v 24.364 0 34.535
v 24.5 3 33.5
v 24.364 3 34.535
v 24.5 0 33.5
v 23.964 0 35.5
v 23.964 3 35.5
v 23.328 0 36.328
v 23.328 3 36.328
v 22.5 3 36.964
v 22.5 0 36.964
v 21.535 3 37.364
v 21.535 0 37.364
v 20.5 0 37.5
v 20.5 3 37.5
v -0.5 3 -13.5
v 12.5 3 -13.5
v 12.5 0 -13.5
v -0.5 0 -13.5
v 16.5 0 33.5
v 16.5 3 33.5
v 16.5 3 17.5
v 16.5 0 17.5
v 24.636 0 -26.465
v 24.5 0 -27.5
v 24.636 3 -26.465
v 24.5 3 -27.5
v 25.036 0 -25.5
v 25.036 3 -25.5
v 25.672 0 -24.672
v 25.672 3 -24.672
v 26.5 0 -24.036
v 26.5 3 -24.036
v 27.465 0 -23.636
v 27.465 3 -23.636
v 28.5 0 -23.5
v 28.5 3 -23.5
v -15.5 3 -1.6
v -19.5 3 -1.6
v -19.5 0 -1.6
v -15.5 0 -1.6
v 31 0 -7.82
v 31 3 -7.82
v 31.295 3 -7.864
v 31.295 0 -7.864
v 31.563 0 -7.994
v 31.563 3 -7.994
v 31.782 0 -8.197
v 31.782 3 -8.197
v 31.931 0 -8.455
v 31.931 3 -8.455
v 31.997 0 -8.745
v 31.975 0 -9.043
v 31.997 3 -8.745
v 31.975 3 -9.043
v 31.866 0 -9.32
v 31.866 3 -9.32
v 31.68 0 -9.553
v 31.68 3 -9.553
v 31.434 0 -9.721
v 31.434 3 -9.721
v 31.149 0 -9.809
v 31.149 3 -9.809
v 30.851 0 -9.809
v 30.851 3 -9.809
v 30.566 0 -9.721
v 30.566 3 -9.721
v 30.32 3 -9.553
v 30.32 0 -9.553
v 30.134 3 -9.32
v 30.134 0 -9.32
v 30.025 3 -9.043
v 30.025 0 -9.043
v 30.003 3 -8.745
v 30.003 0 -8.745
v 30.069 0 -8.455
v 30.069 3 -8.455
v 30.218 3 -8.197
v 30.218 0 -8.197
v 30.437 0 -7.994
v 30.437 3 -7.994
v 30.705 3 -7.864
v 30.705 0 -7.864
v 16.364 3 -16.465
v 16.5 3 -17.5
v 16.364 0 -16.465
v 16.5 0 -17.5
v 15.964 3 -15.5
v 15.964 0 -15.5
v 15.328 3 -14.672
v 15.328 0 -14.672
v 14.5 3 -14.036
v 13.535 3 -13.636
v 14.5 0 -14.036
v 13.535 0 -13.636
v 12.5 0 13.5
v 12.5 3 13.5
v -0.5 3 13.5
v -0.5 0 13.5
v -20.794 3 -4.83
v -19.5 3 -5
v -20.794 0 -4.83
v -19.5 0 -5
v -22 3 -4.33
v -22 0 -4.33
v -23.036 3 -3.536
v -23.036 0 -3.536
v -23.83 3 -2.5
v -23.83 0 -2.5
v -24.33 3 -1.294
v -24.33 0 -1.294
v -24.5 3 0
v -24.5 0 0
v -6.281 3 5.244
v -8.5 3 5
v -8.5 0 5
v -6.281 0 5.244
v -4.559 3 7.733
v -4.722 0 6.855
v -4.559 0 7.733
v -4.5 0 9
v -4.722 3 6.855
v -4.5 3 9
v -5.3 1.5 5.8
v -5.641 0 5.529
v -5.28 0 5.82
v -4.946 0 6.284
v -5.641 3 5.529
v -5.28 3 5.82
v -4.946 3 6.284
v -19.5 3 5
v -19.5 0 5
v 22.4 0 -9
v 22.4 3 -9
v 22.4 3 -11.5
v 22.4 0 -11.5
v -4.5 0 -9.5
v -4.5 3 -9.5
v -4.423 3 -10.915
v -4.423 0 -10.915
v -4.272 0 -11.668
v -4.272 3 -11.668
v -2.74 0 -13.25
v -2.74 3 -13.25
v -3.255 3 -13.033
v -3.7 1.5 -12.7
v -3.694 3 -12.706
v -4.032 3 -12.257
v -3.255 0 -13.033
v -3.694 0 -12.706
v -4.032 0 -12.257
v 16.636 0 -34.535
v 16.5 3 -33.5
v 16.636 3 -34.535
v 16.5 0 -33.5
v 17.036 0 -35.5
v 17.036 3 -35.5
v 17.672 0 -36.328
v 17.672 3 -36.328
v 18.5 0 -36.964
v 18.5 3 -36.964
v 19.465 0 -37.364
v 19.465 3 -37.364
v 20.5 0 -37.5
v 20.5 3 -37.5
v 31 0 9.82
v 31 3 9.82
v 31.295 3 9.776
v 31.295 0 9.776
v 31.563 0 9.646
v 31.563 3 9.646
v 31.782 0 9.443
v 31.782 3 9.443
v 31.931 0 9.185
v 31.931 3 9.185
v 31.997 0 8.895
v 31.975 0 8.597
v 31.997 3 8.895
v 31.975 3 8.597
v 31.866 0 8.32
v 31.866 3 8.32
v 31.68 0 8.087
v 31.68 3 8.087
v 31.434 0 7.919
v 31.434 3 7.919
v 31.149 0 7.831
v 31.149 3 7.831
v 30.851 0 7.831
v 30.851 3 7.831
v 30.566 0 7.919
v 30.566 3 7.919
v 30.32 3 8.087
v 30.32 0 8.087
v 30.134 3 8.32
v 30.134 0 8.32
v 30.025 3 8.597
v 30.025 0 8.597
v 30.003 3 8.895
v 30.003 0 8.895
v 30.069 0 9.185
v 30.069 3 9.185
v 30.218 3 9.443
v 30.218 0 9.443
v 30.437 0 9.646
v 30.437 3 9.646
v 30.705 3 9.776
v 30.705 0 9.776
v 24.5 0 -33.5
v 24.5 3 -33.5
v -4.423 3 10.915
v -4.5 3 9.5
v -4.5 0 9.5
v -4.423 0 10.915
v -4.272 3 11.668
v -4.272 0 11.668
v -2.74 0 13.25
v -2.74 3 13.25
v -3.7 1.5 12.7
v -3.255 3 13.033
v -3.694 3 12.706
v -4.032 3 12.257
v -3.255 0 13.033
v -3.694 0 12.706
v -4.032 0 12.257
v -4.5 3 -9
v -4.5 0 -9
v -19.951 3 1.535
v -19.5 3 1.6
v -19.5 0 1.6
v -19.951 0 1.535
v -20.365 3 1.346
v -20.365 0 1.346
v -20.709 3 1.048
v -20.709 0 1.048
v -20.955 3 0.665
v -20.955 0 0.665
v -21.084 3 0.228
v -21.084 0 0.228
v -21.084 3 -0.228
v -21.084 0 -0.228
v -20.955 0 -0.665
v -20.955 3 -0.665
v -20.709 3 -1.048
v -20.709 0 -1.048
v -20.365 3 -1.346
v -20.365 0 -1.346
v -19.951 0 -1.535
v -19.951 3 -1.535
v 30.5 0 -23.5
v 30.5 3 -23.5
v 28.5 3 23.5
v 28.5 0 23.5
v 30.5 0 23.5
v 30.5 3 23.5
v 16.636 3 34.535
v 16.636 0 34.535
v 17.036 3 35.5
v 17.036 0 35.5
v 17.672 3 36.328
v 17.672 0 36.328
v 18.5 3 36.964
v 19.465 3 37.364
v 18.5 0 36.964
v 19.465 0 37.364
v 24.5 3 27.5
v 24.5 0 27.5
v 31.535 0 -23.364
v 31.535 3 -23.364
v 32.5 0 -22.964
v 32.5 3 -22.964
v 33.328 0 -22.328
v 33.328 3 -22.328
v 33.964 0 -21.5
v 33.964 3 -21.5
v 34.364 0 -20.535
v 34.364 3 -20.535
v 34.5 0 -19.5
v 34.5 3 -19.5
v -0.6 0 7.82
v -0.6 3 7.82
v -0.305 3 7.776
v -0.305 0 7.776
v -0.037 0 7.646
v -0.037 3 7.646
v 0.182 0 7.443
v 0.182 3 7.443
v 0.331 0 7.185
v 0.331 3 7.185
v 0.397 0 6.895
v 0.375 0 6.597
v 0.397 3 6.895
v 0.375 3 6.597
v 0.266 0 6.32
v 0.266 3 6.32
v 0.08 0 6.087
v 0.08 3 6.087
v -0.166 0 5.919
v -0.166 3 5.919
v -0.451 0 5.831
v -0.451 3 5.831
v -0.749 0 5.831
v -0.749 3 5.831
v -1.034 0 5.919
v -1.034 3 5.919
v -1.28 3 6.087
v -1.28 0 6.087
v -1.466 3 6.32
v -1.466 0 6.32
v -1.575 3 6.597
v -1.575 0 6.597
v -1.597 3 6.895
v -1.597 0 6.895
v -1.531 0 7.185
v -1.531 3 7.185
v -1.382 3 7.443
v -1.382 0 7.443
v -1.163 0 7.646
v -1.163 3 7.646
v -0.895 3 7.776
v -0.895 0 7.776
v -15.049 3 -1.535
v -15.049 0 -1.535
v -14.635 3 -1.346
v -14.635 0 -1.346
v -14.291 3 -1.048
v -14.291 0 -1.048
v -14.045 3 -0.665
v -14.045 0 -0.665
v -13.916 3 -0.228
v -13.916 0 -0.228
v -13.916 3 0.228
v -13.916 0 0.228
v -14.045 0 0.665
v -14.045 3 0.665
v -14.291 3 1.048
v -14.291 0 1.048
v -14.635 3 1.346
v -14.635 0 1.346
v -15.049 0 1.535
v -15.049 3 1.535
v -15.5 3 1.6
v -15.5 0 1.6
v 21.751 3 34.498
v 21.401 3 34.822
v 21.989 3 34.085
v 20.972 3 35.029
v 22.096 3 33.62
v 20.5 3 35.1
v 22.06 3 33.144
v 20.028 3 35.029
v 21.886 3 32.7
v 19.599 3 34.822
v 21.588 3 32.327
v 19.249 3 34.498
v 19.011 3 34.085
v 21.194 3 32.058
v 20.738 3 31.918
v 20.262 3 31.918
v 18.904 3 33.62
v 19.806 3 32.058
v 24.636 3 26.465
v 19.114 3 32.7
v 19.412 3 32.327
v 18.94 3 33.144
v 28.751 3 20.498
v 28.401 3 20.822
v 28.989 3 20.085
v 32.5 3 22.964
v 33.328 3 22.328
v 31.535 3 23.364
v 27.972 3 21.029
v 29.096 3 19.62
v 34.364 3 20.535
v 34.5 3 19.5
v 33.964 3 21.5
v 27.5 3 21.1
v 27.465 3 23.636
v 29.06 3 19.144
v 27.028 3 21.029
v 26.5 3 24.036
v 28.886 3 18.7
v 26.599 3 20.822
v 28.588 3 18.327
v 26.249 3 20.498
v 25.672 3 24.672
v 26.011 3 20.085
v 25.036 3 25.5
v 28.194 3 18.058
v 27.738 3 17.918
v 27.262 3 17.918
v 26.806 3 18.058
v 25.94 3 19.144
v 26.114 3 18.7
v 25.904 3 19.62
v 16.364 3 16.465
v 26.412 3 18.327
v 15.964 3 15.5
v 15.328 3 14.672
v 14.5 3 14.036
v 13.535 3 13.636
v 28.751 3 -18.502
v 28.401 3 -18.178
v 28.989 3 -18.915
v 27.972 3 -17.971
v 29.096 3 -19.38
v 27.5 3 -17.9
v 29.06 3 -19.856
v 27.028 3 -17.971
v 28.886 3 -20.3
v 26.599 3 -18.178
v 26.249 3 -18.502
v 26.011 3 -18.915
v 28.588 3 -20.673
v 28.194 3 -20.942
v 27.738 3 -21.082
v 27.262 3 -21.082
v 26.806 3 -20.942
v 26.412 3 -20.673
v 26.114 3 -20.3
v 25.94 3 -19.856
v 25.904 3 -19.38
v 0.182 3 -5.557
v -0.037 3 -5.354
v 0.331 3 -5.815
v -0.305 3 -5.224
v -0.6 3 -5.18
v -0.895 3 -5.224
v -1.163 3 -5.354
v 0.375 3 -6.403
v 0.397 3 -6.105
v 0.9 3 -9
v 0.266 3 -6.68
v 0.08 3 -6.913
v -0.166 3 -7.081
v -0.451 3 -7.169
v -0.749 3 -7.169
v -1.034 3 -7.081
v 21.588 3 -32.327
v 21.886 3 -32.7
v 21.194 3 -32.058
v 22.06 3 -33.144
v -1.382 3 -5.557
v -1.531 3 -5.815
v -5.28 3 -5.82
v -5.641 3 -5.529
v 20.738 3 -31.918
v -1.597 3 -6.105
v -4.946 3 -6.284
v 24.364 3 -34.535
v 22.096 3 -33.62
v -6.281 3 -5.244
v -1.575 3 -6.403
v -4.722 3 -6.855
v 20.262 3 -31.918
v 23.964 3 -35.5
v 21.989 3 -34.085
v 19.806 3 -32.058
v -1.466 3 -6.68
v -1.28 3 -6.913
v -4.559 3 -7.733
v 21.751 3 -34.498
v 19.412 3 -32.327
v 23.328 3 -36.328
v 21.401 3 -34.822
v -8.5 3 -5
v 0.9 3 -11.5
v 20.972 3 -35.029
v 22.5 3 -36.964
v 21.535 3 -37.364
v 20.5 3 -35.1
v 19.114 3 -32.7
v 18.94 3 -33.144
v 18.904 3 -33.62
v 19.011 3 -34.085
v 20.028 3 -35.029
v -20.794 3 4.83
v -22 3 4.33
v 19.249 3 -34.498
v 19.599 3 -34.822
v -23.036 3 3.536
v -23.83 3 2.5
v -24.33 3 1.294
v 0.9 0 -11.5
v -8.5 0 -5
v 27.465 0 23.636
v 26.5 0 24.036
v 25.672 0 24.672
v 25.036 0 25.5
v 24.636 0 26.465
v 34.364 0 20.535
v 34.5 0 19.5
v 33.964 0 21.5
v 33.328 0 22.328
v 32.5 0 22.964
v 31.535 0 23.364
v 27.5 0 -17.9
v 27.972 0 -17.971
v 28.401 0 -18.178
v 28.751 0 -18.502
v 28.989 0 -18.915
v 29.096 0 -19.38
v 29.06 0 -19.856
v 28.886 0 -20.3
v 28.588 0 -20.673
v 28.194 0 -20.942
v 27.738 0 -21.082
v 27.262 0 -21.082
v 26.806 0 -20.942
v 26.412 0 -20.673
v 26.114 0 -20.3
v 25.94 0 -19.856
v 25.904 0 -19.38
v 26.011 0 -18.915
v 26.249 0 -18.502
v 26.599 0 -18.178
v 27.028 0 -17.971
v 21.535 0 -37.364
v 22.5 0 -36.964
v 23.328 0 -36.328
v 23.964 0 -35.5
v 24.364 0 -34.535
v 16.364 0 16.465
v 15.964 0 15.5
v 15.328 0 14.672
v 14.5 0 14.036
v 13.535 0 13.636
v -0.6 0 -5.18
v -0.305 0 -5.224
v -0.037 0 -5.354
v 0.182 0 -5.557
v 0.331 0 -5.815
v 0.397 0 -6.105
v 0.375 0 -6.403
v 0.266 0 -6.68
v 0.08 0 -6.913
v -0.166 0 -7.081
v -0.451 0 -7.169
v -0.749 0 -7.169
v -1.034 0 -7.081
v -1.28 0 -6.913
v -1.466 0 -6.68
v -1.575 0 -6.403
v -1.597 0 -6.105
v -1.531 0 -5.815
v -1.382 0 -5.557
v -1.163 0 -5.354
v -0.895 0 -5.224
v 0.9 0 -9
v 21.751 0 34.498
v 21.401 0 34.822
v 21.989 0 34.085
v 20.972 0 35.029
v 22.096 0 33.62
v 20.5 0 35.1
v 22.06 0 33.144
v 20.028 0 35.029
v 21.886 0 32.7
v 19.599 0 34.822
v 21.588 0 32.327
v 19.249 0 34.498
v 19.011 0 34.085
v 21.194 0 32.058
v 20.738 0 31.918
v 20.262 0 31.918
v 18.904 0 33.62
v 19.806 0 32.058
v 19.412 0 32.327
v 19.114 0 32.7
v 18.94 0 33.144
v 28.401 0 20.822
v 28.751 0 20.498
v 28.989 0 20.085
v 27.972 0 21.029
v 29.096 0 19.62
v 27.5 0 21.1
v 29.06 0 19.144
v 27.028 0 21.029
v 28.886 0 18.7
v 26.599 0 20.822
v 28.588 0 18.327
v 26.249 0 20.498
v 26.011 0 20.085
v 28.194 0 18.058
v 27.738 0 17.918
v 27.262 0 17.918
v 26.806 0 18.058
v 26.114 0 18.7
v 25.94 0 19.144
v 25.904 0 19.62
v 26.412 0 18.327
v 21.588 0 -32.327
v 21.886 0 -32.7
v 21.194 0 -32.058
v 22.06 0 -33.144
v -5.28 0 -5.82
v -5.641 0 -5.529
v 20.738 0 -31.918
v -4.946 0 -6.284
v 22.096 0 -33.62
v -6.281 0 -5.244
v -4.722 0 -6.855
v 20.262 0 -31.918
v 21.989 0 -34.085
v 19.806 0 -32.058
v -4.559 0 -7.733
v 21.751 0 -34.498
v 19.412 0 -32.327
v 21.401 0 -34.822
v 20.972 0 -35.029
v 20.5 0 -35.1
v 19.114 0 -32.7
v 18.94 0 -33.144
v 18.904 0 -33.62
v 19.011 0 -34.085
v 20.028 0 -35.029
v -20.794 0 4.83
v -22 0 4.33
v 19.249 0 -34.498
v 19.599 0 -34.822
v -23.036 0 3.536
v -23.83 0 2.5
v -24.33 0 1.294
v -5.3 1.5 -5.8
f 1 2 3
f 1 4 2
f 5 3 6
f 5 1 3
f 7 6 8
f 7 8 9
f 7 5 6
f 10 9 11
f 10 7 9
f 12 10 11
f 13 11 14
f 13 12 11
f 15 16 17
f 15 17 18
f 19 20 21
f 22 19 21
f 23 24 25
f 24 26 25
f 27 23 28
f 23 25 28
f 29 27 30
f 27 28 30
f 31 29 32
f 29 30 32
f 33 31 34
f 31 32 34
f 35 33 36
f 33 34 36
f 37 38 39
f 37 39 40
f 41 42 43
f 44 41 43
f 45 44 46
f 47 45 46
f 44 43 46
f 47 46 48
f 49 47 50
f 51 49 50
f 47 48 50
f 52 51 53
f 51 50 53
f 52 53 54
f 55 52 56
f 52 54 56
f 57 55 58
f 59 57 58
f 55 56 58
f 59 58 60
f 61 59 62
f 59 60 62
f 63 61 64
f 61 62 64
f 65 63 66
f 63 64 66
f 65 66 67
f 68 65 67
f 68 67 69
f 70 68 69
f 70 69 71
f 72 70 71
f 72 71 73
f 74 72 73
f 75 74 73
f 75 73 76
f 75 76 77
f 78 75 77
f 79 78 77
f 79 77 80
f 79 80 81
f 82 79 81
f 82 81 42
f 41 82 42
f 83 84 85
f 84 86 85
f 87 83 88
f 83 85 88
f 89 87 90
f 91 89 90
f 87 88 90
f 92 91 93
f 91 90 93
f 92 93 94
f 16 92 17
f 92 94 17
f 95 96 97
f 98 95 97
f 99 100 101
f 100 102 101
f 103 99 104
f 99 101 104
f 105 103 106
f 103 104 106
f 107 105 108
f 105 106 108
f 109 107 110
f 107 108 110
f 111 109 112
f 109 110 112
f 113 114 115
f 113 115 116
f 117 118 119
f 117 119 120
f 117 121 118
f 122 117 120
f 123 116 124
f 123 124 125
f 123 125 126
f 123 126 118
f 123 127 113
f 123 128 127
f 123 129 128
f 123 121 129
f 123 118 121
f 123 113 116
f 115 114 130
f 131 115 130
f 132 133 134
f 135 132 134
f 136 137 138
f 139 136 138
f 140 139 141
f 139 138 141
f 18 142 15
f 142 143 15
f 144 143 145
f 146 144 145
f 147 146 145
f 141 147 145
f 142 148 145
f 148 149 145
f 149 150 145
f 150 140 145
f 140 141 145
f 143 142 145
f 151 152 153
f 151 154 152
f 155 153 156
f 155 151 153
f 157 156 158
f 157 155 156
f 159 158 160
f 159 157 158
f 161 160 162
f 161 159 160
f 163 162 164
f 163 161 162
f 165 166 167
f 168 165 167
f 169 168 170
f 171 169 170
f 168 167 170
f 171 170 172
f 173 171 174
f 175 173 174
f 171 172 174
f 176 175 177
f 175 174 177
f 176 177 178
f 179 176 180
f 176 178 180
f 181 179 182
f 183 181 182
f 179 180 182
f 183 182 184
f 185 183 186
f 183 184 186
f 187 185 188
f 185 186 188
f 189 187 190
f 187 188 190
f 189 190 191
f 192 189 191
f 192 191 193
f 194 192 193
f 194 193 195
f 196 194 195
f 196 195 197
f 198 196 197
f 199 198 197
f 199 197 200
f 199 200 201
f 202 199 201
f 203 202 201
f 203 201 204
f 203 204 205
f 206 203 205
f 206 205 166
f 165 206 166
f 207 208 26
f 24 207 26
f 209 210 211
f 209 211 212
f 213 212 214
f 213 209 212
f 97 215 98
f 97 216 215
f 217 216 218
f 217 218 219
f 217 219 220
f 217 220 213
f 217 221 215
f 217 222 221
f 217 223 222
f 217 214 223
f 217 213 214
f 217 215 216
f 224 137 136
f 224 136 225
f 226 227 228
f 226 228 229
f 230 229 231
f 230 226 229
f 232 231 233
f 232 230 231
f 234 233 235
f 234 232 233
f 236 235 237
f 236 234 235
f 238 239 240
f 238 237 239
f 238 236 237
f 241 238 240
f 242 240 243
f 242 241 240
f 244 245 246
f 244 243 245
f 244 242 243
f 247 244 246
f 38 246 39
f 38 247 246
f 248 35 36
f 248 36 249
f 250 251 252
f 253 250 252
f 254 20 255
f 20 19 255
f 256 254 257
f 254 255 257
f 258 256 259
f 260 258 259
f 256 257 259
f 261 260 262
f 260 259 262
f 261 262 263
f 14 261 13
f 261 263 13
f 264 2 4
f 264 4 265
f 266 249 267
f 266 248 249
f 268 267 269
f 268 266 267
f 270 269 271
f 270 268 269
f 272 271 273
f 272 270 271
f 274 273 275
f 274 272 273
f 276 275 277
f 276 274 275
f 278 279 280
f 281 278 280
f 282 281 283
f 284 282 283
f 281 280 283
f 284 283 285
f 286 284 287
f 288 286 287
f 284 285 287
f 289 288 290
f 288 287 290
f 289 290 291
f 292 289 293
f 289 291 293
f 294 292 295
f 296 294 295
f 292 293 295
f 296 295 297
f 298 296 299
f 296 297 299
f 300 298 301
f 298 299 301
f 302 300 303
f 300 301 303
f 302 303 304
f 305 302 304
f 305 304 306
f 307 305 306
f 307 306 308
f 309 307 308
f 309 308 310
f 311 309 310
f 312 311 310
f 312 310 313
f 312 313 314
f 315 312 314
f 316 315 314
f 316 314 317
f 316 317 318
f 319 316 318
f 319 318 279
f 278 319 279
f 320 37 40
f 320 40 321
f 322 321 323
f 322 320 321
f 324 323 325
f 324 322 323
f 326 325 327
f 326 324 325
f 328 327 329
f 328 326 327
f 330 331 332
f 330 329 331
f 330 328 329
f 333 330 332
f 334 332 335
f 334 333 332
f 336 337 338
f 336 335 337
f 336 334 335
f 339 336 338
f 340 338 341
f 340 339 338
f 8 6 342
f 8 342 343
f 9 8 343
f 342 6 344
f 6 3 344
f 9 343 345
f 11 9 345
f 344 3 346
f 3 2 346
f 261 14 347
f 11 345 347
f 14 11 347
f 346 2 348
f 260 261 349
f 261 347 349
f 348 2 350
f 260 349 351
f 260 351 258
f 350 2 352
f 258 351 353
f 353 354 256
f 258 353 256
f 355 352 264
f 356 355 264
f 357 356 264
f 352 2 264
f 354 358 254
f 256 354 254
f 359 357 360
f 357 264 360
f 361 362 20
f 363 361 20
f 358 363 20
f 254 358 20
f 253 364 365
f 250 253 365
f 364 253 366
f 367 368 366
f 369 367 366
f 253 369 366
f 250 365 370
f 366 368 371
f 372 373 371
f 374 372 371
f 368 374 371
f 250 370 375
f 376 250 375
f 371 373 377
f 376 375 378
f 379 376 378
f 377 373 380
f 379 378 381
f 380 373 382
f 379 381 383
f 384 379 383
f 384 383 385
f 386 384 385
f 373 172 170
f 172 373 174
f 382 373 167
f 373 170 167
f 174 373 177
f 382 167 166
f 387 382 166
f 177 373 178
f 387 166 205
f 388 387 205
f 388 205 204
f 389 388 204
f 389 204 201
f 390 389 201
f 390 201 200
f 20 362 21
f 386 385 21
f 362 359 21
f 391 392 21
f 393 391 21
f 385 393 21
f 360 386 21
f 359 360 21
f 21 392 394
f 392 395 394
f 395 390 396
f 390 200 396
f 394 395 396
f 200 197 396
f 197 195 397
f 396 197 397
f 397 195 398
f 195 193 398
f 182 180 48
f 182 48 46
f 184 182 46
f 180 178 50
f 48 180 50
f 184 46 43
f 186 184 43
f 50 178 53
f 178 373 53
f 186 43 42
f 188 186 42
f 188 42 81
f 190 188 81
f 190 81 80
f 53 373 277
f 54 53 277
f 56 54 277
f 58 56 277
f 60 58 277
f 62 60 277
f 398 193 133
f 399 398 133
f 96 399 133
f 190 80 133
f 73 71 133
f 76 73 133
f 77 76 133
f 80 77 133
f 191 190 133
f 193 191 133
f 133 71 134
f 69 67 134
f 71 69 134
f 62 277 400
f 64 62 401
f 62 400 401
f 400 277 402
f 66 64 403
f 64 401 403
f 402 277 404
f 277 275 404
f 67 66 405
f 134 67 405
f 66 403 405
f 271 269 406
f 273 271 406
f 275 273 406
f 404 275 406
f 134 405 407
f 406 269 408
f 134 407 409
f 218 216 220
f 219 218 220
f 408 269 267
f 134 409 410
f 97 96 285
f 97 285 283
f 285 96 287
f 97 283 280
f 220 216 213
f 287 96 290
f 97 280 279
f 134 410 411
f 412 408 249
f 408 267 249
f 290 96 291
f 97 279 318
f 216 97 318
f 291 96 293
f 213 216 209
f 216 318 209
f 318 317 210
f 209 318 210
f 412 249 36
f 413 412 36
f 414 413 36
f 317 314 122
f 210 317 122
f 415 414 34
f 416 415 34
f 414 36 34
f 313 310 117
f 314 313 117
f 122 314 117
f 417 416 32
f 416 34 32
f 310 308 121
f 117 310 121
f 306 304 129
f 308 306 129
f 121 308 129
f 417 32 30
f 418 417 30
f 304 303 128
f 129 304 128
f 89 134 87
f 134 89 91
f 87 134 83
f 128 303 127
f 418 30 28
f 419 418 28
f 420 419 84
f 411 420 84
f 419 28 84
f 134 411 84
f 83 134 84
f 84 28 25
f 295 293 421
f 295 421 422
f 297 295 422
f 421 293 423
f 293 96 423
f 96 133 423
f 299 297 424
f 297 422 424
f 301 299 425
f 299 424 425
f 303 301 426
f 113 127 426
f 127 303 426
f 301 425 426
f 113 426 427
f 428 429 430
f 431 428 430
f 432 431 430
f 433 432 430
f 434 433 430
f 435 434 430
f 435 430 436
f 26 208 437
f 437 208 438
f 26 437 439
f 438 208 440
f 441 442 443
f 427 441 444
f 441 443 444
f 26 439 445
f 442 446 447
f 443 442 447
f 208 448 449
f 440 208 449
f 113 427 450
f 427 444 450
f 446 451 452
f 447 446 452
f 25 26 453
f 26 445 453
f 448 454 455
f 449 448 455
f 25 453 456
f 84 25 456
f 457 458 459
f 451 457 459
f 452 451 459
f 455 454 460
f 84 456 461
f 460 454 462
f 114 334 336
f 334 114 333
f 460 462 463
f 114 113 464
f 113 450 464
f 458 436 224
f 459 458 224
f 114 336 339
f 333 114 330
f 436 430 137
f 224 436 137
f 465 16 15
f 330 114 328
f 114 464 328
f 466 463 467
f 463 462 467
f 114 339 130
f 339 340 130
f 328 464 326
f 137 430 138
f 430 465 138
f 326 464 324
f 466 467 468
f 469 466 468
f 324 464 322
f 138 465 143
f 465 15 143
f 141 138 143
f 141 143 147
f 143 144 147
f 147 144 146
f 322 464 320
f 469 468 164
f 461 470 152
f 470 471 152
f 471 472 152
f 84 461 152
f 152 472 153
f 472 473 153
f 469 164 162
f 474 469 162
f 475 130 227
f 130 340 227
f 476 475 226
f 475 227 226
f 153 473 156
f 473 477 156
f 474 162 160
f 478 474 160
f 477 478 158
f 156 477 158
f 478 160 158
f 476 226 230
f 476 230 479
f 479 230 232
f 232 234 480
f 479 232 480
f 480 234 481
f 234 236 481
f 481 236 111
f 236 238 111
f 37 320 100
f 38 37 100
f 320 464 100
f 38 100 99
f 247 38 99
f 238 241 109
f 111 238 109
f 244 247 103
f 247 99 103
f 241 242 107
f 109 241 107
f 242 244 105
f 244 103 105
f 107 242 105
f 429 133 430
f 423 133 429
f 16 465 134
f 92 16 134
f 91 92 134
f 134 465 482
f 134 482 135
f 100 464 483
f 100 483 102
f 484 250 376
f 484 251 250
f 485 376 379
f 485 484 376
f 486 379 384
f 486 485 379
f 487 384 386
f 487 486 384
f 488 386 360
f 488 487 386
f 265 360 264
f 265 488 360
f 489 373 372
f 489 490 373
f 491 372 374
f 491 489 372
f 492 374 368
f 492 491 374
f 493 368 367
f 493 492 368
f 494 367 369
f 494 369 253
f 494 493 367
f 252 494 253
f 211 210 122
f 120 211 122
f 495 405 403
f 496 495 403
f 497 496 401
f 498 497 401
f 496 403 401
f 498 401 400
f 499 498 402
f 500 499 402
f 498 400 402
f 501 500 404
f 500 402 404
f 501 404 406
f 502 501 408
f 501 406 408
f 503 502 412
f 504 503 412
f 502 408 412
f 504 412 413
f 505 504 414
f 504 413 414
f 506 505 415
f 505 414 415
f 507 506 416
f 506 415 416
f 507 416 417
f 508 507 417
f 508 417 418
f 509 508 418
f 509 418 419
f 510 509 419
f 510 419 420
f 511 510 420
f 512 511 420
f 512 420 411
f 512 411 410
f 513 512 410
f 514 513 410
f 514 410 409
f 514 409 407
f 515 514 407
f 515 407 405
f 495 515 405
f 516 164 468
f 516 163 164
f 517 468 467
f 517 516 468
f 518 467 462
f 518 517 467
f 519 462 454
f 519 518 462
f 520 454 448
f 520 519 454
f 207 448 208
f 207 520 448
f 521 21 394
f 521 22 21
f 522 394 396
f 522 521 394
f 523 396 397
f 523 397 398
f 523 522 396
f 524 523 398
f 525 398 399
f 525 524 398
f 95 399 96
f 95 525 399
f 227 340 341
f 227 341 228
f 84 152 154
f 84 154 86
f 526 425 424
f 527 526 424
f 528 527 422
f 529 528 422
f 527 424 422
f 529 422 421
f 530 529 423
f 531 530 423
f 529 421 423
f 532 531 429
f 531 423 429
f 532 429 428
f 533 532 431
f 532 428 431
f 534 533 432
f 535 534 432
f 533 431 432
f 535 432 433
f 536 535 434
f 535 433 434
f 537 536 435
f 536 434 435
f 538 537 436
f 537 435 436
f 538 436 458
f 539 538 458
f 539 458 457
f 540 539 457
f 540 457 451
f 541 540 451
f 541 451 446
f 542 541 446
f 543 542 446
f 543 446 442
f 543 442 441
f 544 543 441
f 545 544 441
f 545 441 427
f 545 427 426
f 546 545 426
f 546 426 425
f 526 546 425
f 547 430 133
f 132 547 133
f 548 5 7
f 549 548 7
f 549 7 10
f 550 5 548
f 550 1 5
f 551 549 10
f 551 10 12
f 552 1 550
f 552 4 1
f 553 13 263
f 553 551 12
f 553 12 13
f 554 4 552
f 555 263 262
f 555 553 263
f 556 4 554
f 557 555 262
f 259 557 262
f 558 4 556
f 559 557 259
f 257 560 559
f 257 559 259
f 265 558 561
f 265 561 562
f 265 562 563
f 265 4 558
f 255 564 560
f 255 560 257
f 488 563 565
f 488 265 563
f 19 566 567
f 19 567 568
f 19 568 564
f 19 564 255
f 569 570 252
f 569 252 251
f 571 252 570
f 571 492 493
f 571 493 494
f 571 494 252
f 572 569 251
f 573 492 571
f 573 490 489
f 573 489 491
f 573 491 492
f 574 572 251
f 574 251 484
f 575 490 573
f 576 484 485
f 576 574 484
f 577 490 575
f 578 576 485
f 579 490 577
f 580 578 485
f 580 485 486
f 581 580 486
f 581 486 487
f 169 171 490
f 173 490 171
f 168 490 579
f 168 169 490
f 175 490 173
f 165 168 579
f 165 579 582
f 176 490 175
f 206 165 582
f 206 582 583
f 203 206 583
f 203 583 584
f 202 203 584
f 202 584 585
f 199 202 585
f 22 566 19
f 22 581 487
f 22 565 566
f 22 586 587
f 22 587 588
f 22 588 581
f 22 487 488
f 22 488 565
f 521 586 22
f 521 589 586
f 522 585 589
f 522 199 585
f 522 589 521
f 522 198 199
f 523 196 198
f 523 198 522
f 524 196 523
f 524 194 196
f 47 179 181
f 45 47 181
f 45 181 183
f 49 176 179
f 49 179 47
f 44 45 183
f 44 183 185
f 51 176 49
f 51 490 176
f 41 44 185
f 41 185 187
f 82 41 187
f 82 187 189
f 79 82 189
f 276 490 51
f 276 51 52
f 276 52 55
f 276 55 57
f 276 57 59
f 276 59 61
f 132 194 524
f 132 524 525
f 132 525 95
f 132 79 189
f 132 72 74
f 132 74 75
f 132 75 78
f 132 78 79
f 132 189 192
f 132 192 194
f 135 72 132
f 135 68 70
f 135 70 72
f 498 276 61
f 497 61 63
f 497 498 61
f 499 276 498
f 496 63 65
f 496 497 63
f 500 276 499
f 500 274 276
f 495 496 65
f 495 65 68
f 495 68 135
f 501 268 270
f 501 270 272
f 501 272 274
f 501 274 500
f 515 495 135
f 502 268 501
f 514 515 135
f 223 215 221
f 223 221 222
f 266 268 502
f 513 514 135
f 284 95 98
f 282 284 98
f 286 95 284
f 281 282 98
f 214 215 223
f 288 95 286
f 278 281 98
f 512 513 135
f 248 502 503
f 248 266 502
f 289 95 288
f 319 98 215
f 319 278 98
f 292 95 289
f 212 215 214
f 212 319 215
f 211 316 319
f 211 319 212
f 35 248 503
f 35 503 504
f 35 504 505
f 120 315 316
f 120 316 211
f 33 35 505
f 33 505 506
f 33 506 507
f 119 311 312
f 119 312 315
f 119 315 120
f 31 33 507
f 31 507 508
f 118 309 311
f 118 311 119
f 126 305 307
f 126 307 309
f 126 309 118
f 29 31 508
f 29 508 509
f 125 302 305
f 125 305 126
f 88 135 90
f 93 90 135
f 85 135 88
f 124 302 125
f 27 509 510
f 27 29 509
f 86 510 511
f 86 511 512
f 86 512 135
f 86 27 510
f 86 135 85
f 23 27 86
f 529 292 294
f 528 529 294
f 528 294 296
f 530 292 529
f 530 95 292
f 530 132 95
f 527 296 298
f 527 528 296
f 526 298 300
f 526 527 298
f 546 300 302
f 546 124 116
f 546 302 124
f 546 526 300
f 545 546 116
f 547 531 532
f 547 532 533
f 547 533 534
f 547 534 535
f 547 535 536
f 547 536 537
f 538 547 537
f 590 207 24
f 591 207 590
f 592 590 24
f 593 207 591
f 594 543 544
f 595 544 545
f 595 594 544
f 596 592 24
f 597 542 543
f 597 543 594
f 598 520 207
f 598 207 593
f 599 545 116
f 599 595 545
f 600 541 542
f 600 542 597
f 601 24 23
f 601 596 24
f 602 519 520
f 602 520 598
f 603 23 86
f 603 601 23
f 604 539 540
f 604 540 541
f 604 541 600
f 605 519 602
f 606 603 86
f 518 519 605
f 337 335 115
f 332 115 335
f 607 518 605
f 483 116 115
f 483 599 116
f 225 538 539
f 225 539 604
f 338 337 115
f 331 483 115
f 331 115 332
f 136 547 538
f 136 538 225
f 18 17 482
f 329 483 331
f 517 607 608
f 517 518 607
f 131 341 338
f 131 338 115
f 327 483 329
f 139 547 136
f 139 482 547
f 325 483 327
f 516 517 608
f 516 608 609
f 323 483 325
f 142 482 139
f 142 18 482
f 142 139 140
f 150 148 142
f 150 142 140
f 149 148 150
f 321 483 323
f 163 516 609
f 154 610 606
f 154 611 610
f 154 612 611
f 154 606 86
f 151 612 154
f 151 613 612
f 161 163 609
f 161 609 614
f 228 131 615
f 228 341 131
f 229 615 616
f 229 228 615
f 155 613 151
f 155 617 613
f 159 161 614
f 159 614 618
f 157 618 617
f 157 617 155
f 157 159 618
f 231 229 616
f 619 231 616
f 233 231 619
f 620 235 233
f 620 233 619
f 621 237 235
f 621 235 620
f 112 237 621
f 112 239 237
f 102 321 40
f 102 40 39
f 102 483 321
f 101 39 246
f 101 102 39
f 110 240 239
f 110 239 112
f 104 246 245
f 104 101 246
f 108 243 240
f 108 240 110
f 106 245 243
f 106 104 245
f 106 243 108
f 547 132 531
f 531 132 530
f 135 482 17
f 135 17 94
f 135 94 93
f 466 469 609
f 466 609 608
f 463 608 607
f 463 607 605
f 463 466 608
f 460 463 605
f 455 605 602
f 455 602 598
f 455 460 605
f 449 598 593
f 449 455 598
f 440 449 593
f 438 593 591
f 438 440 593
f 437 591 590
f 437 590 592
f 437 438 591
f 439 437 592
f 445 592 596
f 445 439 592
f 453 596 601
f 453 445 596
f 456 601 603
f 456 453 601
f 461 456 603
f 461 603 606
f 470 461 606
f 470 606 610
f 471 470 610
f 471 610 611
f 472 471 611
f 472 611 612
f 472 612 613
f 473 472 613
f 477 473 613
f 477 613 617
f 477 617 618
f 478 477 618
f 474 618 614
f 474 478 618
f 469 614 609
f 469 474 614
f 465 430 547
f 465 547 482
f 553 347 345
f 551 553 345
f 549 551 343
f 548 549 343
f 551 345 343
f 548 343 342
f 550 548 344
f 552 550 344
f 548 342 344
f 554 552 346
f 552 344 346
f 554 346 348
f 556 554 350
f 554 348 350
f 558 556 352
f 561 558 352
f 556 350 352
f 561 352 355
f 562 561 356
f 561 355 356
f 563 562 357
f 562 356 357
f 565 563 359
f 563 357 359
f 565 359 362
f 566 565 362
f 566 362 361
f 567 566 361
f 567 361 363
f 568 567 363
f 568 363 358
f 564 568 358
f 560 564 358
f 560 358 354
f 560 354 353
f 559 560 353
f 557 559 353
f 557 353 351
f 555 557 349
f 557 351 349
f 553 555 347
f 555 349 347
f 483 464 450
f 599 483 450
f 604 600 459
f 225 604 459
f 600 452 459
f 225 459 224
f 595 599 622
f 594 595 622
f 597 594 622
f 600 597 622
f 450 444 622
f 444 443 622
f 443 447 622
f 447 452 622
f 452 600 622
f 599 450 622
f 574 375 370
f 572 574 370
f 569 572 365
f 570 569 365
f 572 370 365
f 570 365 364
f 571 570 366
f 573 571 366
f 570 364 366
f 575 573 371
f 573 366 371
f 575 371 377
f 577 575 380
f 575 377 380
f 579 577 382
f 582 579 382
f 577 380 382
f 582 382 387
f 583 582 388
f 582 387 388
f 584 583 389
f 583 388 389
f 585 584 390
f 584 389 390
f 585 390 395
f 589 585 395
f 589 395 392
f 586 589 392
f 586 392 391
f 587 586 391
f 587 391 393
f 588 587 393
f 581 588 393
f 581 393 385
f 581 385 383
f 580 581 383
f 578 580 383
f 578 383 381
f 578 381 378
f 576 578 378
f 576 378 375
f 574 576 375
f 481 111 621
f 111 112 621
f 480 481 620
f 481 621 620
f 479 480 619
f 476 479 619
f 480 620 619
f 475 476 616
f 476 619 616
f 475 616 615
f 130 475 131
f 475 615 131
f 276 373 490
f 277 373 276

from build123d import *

# Parameters (mm, degrees)
CROQUIS1_W              = 81
CROQUIS1_H              = 47
SALIENTE_EXTRUIR1_DEPTH = 3
CORTAR_EXTRUIR2_DEPTH   = 47.920144927
CROQUIS2_R              = 1.6
CORTAR_EXTRUIR1_DEPTH   = 47.920144927
CROQUIS5_R              = 1
CROQUIS5_W              = 16
CROQUIS5_H              = 59.242740908
CROQUIS5_W_2            = 21.5
CROQUIS5_H_2            = 2.5
CORTAR_EXTRUIR4_DEPTH   = 10
CORTAR_EXTRUIR5_DEPTH   = 10
CROQUIS7_W              = 27.893037997
CROQUIS7_H              = 58.785327392
CORTAR_EXTRUIR6_DEPTH   = 10
CROQUIS8_W              = 8
CROQUIS8_H              = 24
CROQUIS8_R              = 1.6
SALIENTE_EXTRUIR2_DEPTH = 3
REDONDEO1_R             = 4
REDONDEO4_R             = 5
REDONDEO3_SIZE          = 4


# Some blends are built 0.0001 mm under size
with BuildPart() as part:
    # Croquis1 → Saliente-Extruir1 (new body)
    with BuildSketch(Plane(origin=(0, 0, 0), x_dir=(1, 0, 0), z_dir=(0, 1, 0))):
        Rectangle(CROQUIS1_W, CROQUIS1_H)
    extrude(amount=SALIENTE_EXTRUIR1_DEPTH)

    # Croquis3 → Cortar-Extruir2 (cut, through all)
    with BuildSketch(Plane(origin=(0, 3, 0), x_dir=(1, 0, 0), z_dir=(0, 1, 0))):
        Polygon((-32.5, 23.5), (23.5, 23.5), (23.5, 13.5), (-4.5, 13.5), (-4.5, 5), (-32.5, 5), align=None)
        Polygon((-32.5, -5), (-32.5, -23.5), (23.5, -23.5), (23.5, -13.5), (-4.5, -13.5), (-4.5, -5), align=None)
    extrude(amount=-CORTAR_EXTRUIR2_DEPTH, mode=Mode.SUBTRACT)

    # Croquis2 → Cortar-Extruir1 (cut, through all)
    with BuildSketch(Plane(origin=(0, 3, 0), x_dir=(1, 0, 0), z_dir=(0, 1, 0))):
        with Locations(Location((-36.5, 19.5, 0), (0, 0, 270))):
            Circle(CROQUIS2_R)
        with Locations(Location((-36.5, -19.5, 0), (0, 0, 270))):
            Circle(CROQUIS2_R)
        with Locations(Location((27.5, 19.5, 0), (0, 0, 270))):
            Circle(CROQUIS2_R)
        with Locations(Location((27.5, -19.5, 0), (0, 0, 270))):
            Circle(CROQUIS2_R)
        with Locations(Location((-36.5, 11.5, 0), (0, 0, 270))):
            Circle(CROQUIS2_R)
        with Locations(Location((-36.5, -11.5, 0), (0, 0, 270))):
            Circle(CROQUIS2_R)
    extrude(amount=-CORTAR_EXTRUIR1_DEPTH, mode=Mode.SUBTRACT)

    # Croquis5 → Cortar-Extruir4 (cut)
    with BuildSketch(Plane(origin=(0, 3, 0), x_dir=(1, 0, 0), z_dir=(0, 1, 0))):
        with Locations(Location((-0.6, 6.18, 0), (0, 0, 270))):
            Circle(CROQUIS5_R)
        with Locations(Location((31, 8.82, 0), (0, 0, 270))):
            Circle(CROQUIS5_R)
        with Locations(Location((31, -8.82, 0), (0, 0, 270))):
            Circle(CROQUIS5_R)
        with Locations(Location((-0.6, -6.82, 0), (0, 0, 270))):
            Circle(CROQUIS5_R)
        with Locations((42.5, 1.68576905)):
            Rectangle(CROQUIS5_W, CROQUIS5_H)
        with Locations((11.65, 10.25)):
            Rectangle(CROQUIS5_W_2, CROQUIS5_H_2)
    extrude(amount=-CORTAR_EXTRUIR4_DEPTH, mode=Mode.SUBTRACT)

    # Croquis6 → Cortar-Extruir5 (cut)
    with BuildSketch(Plane(origin=(0, 3, 0), x_dir=(1, 0, 0), z_dir=(0, 1, 0))):
        with BuildLine():
            Line((-19.5, 1.6), (-15.5, 1.6))
            ThreePointArc((-15.5, 1.6), (-13.9, 0), (-15.5, -1.6))
            Line((-15.5, -1.6), (-19.5, -1.6))
            ThreePointArc((-19.5, -1.6), (-21.1, 0), (-19.5, 1.6))
        make_face()
    extrude(amount=-CORTAR_EXTRUIR5_DEPTH, mode=Mode.SUBTRACT)

    # Croquis7 → Cortar-Extruir6 (cut)
    with BuildSketch(Plane(origin=(0, 3, 0), x_dir=(1, 0, 0), z_dir=(0, 1, 0))):
        with Locations((-38.446518998, -0.587422332)):
            Rectangle(CROQUIS7_W, CROQUIS7_H)
    extrude(amount=-CORTAR_EXTRUIR6_DEPTH, mode=Mode.SUBTRACT)

    # Croquis8 → Saliente-Extruir2 (add, through all)
    with BuildSketch(Plane(origin=(0, 3, 0), x_dir=(1, 0, 0), z_dir=(0, 1, 0))):
        with Locations((20.5, -25.5)):
            Rectangle(CROQUIS8_W, CROQUIS8_H)
        with Locations(Location((20.5, -33.5, 0), (0, 0, 270))):
            Circle(CROQUIS8_R, mode=Mode.SUBTRACT)
    saliente_extruir2 = extrude(amount=-SALIENTE_EXTRUIR2_DEPTH)

    # Simetría1: Saliente-Extruir2 across plane
    add(saliente_extruir2.mirror(Plane.XY))

    # Redondeo1
    redondeo1_edges = [part.edges().sort_by_distance(p)[0] for p in [
        (34.5, 1.5, 23.5),
        (34.5, 1.5, -23.5),
        (16.5, 1.5, 37.5),
        (24.5, 1.5, 37.5),
        (16.5, 1.5, 13.5),
        (24.5, 1.5, 23.5),
        (24.5, 1.5, -37.5),
        (16.5, 1.5, -37.5),
        (16.5, 1.5, -13.5),
        (24.5, 1.5, -23.5),
    ]]
    fillet(redondeo1_edges, radius=REDONDEO1_R - 0.0001)  # a hair under: the kernel refuses the full size

    # Redondeo4
    redondeo4_edges = [part.edges().sort_by_distance(p)[0] for p in [
        (-24.5, 1.5, -5),
        (-24.5, 1.5, 5),
    ]]
    fillet(redondeo4_edges, radius=REDONDEO4_R - 0.0001)  # a hair under: the kernel refuses the full size

    # Redondeo3
    # a fillet whose section is not a circle: 4 mm, written as the material it adds along each edge
    with BuildSketch(Plane(origin=(-4.5, 3, 5), x_dir=(-1, 0, 0), z_dir=(0, -1, 0))) as redondeo3_piece_1:
        with BuildLine():
            Bezier((REDONDEO3_SIZE, 0), (0, 0), (0, -REDONDEO3_SIZE), weights=[1, 1.5, 1])
            Line((0, -REDONDEO3_SIZE), (0, 0))
            Line((0, 0), (REDONDEO3_SIZE, 0))
        make_face()
    extrude(amount=3)
    with BuildSketch(Plane(origin=(-4.5, 3, -5), x_dir=(-1, 0, 0), z_dir=(0, -1, 0))) as redondeo3_piece_2:
        with BuildLine():
            Bezier((REDONDEO3_SIZE, 0), (0, 0), (0, REDONDEO3_SIZE), weights=[1, 1.5, 1])
            Line((0, REDONDEO3_SIZE), (0, 0))
            Line((0, 0), (REDONDEO3_SIZE, 0))
        make_face()
    extrude(amount=3)
    # a fillet whose section is not a circle: 4 mm, written as the material it takes off along each edge
    with BuildSketch(Plane(origin=(-4.5, 13, 13.5), x_dir=(0, 0, -1), z_dir=(0, -1, 0))) as redondeo3_2_piece_1:
        with BuildLine():
            Bezier((REDONDEO3_SIZE, 0), (0, 0), (0, REDONDEO3_SIZE), weights=[1, 1.5, 1])
            Line((0, REDONDEO3_SIZE), (0, 0))
            Line((0, 0), (REDONDEO3_SIZE, 0))
        make_face()
    extrude(amount=23, mode=Mode.SUBTRACT)
    with BuildSketch(Plane(origin=(-4.5, 13, -13.5), x_dir=(0, 0, 1), z_dir=(0, -1, 0))) as redondeo3_2_piece_2:
        with BuildLine():
            Bezier((REDONDEO3_SIZE, 0), (0, 0), (0, -REDONDEO3_SIZE), weights=[1, 1.5, 1])
            Line((0, -REDONDEO3_SIZE), (0, 0))
            Line((0, 0), (REDONDEO3_SIZE, 0))
        make_face()
    extrude(amount=23, mode=Mode.SUBTRACT)


solid = part.part
